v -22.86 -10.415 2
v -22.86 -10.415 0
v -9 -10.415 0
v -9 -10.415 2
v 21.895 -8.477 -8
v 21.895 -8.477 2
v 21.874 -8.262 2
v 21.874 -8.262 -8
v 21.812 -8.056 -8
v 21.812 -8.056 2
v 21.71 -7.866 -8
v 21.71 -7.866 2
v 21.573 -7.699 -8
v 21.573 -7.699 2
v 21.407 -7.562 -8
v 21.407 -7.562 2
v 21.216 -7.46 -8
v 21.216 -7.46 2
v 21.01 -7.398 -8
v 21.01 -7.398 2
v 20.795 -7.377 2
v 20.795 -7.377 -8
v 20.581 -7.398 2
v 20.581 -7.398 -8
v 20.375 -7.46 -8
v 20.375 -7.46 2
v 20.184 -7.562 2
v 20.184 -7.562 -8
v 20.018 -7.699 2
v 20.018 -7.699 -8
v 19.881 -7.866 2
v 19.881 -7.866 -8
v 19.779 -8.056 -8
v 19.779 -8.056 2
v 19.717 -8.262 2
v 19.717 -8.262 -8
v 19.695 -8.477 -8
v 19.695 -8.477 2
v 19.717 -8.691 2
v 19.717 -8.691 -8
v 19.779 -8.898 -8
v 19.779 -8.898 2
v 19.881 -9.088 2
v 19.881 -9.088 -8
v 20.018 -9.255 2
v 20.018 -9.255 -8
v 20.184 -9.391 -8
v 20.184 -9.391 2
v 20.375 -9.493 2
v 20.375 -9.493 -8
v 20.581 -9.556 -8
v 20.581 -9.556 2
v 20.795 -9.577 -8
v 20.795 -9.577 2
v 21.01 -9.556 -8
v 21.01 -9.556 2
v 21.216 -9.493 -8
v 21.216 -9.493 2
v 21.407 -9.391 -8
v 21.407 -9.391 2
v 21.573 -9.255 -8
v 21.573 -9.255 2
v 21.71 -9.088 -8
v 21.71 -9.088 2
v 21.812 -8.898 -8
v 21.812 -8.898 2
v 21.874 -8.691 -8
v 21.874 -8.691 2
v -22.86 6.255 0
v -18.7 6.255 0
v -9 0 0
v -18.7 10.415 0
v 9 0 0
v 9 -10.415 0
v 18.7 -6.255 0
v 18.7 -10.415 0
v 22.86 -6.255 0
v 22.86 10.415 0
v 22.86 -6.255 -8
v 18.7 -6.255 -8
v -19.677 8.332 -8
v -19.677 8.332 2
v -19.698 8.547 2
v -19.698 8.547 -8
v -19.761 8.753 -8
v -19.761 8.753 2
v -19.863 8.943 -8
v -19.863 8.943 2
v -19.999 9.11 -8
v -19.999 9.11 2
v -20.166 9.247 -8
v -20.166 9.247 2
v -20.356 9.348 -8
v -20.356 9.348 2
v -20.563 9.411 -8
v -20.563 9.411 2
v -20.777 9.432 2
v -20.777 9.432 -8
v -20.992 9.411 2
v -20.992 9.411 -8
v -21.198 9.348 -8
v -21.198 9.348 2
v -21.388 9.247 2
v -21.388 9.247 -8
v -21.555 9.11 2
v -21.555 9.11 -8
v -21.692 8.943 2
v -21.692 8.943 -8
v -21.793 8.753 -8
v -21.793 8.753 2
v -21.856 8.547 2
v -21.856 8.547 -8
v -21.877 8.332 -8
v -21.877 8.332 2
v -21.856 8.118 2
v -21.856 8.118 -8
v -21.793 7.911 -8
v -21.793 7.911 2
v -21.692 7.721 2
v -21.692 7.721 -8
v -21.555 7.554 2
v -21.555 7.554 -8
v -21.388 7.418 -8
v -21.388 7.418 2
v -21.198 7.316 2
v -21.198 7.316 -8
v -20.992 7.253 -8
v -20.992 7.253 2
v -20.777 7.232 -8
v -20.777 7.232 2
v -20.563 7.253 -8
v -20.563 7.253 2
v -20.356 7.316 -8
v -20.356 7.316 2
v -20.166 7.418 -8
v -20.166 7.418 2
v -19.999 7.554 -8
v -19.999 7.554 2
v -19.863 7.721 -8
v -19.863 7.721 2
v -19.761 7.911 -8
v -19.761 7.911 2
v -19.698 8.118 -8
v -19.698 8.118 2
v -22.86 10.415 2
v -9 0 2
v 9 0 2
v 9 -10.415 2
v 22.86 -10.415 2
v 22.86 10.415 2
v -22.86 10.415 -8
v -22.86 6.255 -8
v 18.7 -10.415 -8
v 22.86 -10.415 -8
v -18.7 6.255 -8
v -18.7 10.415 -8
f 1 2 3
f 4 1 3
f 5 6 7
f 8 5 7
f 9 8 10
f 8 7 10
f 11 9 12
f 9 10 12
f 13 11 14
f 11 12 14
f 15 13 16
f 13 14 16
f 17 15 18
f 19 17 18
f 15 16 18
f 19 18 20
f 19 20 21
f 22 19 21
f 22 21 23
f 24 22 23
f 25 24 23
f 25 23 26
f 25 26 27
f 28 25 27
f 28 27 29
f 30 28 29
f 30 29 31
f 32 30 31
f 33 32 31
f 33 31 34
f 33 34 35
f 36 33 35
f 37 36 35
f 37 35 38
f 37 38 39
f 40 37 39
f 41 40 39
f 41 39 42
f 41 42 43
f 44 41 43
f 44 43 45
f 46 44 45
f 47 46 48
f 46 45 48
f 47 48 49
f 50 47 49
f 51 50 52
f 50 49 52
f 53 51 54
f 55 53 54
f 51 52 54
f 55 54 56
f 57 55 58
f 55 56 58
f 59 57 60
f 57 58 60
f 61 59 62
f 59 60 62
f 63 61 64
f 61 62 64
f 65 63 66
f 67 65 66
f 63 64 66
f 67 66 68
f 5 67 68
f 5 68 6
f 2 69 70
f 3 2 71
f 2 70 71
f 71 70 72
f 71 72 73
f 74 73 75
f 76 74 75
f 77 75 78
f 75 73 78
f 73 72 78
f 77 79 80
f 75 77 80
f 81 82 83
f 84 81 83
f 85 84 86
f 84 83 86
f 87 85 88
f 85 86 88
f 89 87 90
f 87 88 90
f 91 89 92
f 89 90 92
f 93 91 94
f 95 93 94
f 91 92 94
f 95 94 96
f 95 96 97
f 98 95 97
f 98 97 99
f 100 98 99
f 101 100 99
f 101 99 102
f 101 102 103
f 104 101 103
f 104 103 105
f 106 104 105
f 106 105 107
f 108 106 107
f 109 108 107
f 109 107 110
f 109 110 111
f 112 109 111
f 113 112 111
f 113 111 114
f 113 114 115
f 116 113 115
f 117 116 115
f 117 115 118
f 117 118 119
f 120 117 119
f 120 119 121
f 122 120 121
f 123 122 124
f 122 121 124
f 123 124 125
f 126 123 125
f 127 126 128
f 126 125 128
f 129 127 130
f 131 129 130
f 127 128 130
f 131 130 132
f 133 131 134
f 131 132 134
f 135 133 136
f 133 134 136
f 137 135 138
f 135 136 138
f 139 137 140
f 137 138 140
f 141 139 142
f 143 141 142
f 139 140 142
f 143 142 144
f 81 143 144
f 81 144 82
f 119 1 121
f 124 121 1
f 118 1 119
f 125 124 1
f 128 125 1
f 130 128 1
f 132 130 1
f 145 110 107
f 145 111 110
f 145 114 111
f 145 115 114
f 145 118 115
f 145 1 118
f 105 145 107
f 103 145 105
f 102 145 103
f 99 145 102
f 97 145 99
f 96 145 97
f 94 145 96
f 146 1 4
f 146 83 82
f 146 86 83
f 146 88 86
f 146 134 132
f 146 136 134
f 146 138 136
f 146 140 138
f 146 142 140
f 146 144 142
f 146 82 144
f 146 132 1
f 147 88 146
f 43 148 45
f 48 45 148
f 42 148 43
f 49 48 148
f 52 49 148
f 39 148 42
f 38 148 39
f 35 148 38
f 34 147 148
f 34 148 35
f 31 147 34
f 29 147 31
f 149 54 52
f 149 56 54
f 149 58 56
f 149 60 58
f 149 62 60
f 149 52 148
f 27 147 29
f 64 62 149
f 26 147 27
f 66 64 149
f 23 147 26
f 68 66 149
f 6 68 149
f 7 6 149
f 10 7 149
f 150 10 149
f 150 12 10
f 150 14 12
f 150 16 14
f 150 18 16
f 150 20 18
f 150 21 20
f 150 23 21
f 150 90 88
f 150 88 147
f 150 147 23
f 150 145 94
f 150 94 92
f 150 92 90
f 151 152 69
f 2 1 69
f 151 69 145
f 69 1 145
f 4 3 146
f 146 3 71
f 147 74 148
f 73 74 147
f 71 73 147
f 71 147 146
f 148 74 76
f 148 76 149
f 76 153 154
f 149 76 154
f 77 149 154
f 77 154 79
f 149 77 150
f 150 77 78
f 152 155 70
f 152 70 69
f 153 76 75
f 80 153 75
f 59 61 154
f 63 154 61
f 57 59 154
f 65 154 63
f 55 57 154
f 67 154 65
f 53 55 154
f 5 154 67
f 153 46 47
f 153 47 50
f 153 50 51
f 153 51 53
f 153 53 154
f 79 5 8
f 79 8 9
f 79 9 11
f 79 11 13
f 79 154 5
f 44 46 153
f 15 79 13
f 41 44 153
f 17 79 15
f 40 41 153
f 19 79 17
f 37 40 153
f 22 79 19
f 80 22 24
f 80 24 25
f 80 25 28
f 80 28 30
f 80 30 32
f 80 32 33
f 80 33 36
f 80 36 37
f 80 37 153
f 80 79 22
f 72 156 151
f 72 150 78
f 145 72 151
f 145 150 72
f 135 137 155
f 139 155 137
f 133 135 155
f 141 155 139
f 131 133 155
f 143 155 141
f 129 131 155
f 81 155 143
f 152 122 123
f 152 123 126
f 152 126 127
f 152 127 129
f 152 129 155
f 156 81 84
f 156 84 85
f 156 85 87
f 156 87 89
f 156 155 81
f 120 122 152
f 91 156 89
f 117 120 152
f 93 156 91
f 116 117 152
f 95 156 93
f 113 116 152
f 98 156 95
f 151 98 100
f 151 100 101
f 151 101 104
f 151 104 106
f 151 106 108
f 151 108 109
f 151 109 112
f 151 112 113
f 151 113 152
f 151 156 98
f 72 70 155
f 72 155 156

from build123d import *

# Parameters (mm, degrees)
SKIZZE1_W                       = 45.72
SKIZZE1_H                       = 20.83
AUFSATZ_LINEAR_AUSTRAGEN1_DEPTH = 2
SKIZZE3_W                       = 18
SKIZZE3_H                       = 10.415
SCHNITT_LINEAR_AUSTRAGEN1_DEPTH = 10
SKIZZE7_W                       = 4.16
SKIZZE7_H                       = 4.16
AUFSATZ_LINEAR_AUSTRAGEN2_DEPTH = 8
DURCHGANGSLOCH_F_R_M21_D        = 2.2


with BuildPart() as part:
    # Skizze1 → Aufsatz-Linear austragen1 (new body)
    with BuildSketch(Plane.XY):
        Rectangle(SKIZZE1_W, SKIZZE1_H)
    extrude(amount=AUFSATZ_LINEAR_AUSTRAGEN1_DEPTH)

    # Skizze3 → Schnitt-Linear austragen1 (cut)
    with BuildSketch(Plane(origin=(0, 0, 0), x_dir=(-1, 0, 0), z_dir=(0, 0, -1))):
        with Locations((0, -5.2075)):
            Rectangle(SKIZZE3_W, SKIZZE3_H)
    extrude(amount=-SCHNITT_LINEAR_AUSTRAGEN1_DEPTH, mode=Mode.SUBTRACT)

    # Skizze7 → Aufsatz-Linear austragen2 (add)
    with BuildSketch(Plane(origin=(0, 0, 0), x_dir=(-1, 0, 0), z_dir=(0, 0, -1))):
        with Locations((20.78, 8.335)):
            Rectangle(SKIZZE7_W, SKIZZE7_H)
        with Locations((-20.78, -8.335)):
            Rectangle(SKIZZE7_W, SKIZZE7_H)
    extrude(amount=AUFSATZ_LINEAR_AUSTRAGEN2_DEPTH)

    # Durchgangsloch für M21 (through all)
    with Locations(Plane(origin=(0, 0, -8), x_dir=(-1, 0, 0), z_dir=(0, 0, -1))):
        with Locations((-20.795475973, -8.476722081), (20.7772, 8.3322)):
            Hole(DURCHGANGSLOCH_F_R_M21_D / 2)


solid = part.part
